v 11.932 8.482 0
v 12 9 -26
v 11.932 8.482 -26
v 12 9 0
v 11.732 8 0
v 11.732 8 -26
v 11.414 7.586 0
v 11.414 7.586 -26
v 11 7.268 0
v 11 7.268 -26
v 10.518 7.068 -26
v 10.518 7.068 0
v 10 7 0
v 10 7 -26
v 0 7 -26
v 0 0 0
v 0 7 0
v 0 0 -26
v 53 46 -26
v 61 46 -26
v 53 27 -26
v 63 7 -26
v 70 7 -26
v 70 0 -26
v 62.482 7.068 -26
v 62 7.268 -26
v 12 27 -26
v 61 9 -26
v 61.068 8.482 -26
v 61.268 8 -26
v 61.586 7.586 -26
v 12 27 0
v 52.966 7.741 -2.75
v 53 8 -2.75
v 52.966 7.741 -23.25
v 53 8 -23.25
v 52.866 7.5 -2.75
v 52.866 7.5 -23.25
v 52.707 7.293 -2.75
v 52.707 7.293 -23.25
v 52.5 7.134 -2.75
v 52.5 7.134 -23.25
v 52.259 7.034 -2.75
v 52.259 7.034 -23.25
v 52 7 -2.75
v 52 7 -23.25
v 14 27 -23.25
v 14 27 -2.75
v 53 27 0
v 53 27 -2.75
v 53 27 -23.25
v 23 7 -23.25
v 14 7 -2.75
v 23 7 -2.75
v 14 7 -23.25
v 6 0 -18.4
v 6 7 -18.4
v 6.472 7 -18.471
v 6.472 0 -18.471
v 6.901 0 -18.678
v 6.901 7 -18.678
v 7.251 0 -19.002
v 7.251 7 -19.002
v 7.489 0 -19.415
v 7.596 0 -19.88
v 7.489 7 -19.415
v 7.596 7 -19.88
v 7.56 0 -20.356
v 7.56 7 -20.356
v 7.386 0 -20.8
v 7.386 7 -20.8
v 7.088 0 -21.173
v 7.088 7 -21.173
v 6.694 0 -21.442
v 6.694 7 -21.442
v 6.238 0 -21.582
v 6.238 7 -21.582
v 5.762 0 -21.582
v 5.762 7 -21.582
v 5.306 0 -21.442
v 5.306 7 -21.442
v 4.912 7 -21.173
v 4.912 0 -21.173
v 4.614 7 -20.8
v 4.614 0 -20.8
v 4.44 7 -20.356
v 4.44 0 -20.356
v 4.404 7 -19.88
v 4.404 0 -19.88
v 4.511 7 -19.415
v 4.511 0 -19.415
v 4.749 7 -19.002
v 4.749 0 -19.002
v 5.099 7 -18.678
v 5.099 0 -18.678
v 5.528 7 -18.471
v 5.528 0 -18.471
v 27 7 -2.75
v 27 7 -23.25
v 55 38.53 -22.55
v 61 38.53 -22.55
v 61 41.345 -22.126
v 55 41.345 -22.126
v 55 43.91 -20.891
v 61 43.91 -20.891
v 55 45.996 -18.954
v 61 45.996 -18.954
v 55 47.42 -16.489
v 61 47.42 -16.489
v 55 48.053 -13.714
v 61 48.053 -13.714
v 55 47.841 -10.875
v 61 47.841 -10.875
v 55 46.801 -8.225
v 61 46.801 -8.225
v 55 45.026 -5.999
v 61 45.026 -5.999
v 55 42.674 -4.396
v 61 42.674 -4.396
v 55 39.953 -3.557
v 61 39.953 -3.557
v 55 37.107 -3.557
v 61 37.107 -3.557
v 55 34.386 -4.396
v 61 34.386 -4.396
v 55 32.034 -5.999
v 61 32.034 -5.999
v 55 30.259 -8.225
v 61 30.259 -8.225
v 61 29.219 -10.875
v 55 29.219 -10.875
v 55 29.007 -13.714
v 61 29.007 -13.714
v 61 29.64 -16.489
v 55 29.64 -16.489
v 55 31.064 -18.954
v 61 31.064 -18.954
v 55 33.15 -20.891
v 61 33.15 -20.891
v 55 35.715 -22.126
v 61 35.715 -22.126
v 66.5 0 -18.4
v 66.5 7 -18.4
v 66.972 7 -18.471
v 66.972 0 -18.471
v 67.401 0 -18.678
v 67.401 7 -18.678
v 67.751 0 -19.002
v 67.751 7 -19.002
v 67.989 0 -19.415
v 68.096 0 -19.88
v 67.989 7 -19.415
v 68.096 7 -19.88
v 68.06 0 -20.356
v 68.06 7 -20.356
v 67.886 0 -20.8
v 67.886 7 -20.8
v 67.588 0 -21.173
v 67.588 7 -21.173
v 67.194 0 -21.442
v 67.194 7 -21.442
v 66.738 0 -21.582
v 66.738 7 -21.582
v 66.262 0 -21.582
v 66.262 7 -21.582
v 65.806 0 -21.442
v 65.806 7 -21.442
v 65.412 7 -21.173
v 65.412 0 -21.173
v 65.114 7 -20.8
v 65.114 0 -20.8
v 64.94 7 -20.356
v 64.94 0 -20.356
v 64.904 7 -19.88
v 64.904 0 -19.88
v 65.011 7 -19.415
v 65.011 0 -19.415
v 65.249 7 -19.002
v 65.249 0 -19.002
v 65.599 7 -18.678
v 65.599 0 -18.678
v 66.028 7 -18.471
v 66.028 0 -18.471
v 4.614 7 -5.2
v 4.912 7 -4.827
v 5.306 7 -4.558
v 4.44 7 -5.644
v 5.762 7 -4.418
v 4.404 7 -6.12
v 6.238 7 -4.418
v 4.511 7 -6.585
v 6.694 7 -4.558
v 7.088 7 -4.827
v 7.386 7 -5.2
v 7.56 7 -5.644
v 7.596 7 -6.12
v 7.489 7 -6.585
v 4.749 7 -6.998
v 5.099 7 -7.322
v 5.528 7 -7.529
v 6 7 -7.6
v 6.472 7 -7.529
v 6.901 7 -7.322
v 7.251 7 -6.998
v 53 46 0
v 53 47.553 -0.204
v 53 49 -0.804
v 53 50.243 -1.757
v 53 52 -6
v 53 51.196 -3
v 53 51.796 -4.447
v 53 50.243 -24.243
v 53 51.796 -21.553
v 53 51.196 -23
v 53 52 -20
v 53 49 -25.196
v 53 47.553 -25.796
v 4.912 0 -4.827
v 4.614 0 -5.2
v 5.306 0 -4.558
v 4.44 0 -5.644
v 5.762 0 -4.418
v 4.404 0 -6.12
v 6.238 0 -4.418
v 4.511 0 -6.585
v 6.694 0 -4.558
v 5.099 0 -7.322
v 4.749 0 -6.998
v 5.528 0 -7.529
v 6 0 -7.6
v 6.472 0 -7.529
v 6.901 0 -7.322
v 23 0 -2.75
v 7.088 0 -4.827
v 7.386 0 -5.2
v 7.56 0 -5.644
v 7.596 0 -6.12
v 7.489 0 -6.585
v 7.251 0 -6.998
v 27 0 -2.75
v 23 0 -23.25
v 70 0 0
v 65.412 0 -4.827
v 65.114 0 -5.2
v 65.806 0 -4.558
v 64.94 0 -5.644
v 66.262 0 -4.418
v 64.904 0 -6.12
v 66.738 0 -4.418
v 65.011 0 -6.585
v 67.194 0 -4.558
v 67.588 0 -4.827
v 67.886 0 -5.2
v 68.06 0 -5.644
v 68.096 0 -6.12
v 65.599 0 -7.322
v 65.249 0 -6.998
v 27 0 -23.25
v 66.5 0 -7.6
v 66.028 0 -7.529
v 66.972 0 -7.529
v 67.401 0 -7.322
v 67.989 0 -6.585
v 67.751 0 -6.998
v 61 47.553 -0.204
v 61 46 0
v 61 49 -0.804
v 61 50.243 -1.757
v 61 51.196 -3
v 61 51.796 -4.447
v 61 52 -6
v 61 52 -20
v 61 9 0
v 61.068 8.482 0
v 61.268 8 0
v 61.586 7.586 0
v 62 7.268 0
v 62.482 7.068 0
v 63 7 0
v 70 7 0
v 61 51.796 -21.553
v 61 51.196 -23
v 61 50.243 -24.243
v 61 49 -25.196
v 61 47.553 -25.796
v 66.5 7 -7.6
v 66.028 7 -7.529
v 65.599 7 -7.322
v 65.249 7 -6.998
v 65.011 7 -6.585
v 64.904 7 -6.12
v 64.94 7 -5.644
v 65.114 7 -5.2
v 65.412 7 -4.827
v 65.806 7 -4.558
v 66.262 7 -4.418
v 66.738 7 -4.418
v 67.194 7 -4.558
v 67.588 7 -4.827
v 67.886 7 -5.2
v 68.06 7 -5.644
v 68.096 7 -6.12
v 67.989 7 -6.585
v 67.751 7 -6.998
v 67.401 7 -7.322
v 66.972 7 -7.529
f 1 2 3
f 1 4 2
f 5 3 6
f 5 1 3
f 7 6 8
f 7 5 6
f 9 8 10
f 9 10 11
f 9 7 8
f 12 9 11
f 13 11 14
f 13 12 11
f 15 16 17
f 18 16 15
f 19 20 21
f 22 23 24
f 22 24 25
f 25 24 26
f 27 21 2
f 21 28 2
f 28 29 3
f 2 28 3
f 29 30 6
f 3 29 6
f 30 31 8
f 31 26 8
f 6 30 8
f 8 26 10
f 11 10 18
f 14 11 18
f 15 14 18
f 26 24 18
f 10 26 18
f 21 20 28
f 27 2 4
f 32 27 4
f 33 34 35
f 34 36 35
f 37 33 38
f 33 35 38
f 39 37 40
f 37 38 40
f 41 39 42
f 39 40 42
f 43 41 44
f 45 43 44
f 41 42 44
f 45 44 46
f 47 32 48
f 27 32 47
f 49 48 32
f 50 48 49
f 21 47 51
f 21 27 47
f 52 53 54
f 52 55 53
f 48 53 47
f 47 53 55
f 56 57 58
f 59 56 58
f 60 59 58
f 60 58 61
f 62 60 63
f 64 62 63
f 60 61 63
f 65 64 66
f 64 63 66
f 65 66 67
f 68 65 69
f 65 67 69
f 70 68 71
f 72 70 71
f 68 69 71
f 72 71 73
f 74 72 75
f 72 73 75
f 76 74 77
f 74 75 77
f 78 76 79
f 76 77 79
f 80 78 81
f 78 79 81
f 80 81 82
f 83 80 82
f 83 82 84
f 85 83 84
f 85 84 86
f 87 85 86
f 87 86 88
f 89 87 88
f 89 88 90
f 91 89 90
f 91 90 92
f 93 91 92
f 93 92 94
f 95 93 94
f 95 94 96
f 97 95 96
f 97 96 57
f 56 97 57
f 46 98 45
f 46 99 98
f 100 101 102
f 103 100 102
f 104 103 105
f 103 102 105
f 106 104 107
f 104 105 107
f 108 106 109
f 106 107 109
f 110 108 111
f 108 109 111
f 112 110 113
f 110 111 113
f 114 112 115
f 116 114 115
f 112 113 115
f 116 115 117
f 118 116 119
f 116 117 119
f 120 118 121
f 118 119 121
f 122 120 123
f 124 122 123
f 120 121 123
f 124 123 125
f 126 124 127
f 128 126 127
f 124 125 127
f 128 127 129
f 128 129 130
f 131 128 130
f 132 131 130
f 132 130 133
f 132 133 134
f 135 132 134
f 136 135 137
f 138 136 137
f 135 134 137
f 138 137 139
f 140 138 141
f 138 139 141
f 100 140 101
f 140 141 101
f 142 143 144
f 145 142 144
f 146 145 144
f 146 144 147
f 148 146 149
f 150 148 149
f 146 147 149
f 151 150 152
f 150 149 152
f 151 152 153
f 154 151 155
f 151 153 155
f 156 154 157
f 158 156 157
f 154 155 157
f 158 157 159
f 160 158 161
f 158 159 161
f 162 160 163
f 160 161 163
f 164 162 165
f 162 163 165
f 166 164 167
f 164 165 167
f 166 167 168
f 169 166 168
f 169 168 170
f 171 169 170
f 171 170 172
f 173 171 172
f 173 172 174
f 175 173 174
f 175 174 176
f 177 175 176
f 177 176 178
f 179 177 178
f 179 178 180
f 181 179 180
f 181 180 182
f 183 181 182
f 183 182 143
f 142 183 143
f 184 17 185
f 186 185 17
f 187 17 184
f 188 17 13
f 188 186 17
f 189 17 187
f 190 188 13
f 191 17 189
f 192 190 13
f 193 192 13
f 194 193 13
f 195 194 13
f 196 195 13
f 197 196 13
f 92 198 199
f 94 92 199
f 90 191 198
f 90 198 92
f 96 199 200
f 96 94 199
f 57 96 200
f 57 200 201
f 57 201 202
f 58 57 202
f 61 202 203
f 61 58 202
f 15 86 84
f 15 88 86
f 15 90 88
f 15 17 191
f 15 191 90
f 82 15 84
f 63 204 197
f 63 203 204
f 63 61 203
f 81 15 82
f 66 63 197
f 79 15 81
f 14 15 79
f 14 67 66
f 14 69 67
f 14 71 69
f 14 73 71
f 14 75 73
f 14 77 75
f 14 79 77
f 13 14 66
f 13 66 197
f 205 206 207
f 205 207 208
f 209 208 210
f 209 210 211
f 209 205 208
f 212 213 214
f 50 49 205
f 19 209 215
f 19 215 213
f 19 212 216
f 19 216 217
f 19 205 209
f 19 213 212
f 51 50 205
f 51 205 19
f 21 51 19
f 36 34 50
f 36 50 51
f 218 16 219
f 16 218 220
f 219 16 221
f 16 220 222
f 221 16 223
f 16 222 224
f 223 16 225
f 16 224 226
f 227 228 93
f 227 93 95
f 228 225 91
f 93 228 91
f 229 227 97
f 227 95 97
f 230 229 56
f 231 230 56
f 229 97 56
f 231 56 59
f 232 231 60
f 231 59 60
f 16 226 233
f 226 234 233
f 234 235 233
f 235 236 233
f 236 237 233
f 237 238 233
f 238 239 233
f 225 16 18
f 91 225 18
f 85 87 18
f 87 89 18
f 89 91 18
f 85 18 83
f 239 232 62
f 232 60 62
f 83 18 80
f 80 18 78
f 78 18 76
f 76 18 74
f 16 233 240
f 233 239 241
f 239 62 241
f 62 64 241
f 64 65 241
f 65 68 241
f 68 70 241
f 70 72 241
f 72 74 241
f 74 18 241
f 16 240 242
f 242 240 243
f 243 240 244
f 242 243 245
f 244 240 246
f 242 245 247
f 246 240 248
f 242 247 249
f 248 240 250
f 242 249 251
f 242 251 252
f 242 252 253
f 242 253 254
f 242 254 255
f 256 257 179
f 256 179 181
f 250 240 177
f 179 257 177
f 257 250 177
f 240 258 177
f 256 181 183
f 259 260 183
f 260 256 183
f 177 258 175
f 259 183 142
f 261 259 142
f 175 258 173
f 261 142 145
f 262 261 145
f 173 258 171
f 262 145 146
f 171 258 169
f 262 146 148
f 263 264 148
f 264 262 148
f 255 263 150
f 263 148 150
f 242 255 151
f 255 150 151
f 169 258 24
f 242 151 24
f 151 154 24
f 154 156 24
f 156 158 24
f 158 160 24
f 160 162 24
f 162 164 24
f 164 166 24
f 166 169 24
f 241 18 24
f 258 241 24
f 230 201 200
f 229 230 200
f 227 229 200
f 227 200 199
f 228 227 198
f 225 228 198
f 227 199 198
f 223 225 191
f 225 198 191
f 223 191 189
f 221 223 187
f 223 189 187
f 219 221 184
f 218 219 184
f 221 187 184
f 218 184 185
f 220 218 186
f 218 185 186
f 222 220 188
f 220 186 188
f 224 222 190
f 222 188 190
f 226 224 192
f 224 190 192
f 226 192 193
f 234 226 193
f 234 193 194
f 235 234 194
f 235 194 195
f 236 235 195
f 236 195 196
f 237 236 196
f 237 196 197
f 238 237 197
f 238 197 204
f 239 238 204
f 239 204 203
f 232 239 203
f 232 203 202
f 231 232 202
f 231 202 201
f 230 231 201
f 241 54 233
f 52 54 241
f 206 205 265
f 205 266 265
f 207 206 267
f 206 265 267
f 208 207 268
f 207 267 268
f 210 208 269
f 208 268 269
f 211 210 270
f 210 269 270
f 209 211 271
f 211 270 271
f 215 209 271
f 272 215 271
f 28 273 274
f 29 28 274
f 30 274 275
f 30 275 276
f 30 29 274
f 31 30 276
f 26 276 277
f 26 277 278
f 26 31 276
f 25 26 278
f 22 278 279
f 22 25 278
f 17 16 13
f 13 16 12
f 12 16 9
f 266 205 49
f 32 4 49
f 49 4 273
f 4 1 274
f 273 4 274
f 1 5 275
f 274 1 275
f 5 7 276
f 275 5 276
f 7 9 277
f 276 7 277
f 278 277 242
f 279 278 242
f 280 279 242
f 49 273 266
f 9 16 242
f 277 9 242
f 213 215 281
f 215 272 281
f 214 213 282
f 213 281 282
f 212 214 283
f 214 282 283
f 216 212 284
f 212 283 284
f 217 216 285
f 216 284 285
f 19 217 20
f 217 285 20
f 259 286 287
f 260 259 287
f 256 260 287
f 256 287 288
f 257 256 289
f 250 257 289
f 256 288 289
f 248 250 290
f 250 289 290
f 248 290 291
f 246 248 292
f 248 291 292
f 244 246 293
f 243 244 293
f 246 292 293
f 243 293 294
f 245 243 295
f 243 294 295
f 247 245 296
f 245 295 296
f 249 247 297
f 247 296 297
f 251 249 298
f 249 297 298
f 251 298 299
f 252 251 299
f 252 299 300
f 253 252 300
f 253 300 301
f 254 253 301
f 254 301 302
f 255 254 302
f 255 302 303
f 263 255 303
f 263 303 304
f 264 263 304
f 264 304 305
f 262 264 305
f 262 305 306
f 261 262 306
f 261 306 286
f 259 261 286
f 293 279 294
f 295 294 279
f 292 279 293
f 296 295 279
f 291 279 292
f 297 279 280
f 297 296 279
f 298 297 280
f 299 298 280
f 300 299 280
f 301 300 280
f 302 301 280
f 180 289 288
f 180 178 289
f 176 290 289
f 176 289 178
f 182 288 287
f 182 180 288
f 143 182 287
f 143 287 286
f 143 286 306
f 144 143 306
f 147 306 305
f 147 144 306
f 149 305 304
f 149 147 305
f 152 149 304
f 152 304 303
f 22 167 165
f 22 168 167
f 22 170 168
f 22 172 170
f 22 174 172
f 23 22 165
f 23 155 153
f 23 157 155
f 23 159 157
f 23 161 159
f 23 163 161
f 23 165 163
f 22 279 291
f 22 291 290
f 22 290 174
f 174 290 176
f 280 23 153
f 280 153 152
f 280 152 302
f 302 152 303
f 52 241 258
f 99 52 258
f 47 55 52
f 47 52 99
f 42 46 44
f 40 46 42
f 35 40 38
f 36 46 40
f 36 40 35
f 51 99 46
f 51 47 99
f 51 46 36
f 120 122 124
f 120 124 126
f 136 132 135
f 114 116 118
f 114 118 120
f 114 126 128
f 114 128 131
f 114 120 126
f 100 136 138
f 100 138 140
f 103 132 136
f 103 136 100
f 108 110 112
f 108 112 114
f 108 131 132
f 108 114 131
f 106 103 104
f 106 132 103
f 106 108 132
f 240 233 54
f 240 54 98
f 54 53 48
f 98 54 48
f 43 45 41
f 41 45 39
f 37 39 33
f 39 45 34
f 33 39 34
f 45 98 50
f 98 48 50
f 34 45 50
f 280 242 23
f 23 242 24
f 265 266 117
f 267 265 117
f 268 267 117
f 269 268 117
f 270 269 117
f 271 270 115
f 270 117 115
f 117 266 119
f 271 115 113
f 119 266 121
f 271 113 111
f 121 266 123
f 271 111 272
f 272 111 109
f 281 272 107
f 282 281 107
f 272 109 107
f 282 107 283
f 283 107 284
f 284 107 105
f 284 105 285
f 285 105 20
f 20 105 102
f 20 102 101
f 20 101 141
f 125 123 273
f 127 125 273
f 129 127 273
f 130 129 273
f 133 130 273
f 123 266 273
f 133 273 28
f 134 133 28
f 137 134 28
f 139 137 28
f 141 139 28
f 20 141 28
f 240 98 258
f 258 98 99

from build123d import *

# Parameters (mm, degrees)
ESQUISSE1_W             = 70
ESQUISSE1_H             = 26
BOSS_EXTRU_1_DEPTH      = 7
ESQUISSE2_W             = 8
ESQUISSE2_H             = 26
BOSS_EXTRU_2_DEPTH      = 45
BOSS_EXTRU_3_DEPTH      = 20
ENL_V_MAT_EXTRU_1_REACH = 89.184
ESQUISSE4_W             = 4
ESQUISSE4_H             = 20.5
CONG_1_R                = 1
CONG_2_R                = 2
ENL_V_MAT_EXTRU_2_REACH = 89.184
ESQUISSE5_R             = 1.6
CONG_3_R                = 6
ESQUISSE6_R             = 9.55
ENL_V_MAT_EXTRU_3_DEPTH = 6


with BuildPart() as part:
    # Esquisse1 → Boss.-Extru.1 (new body)
    with BuildSketch(Plane(origin=(0, 0, 0), x_dir=(1, 0, 0), z_dir=(0, 1, 0))):
        with Locations((35, 13)):
            Rectangle(ESQUISSE1_W, ESQUISSE1_H)
    extrude(amount=BOSS_EXTRU_1_DEPTH)

    # Esquisse2 → Boss.-Extru.2 (add)
    with BuildSketch(Plane(origin=(0, 7, 0), x_dir=(1, 0, 0), z_dir=(0, 1, 0))):
        with Locations((57, 13)):
            Rectangle(ESQUISSE2_W, ESQUISSE2_H)
    extrude(amount=BOSS_EXTRU_2_DEPTH)

    # Esquisse3 → Boss.-Extru.3 (add)
    with BuildSketch(Plane(origin=(0, 7, 0), x_dir=(1, 0, 0), z_dir=(0, 1, 0))):
        Polygon((53, 26), (12, 26), (12, 0), (53, 0), (53, 2.75), (14, 2.75), (14, 23.25), (53, 23.25), align=None)
    extrude(amount=BOSS_EXTRU_3_DEPTH)

    # Esquisse4 → Enlèv. mat.-Extru.1 (cut, up to next)
    with BuildSketch(Plane(origin=(0, 7, 0), x_dir=(1, 0, 0), z_dir=(0, 1, 0)), mode=Mode.PRIVATE) as enl_v_mat_extru_1_sk1:
        with Locations((25, 13)):
            Rectangle(ESQUISSE4_W, ESQUISSE4_H)
    enl_v_mat_extru_1_tool1 = extrude(enl_v_mat_extru_1_sk1.sketch, amount=-ENL_V_MAT_EXTRU_1_REACH, mode=Mode.PRIVATE) & part.part
    add(enl_v_mat_extru_1_tool1.solids().sort_by_distance((25, 7, -13))[0], mode=Mode.SUBTRACT)

    # Congé1
    cong_1_edges = [part.edges().sort_by_distance(p)[0] for p in [
        (53, 7, -13),
    ]]
    fillet(cong_1_edges, radius=CONG_1_R)

    # Congé2
    cong_2_edges = [part.edges().sort_by_distance(p)[0] for p in [
        (61, 7, -13),
        (12, 7, -13),
    ]]
    fillet(cong_2_edges, radius=CONG_2_R)

    # Esquisse5 → Enlèv. mat.-Extru.2 (cut, up to next)
    with BuildSketch(Plane(origin=(0, 7, 0), x_dir=(1, 0, 0), z_dir=(0, 1, 0)), mode=Mode.PRIVATE) as enl_v_mat_extru_2_sk1:
        with Locations(Location((6, 20, 0), (0, 0, 270))):
            Circle(ESQUISSE5_R)
    enl_v_mat_extru_2_tool1 = extrude(enl_v_mat_extru_2_sk1.sketch, amount=-ENL_V_MAT_EXTRU_2_REACH, mode=Mode.PRIVATE) & part.part
    # Esquisse5 → Enlèv. mat.-Extru.2 (cut, up to next)
    with BuildSketch(Plane(origin=(0, 7, 0), x_dir=(1, 0, 0), z_dir=(0, 1, 0)), mode=Mode.PRIVATE) as enl_v_mat_extru_2_sk2:
        with Locations(Location((66.5, 20, 0), (0, 0, 270))):
            Circle(ESQUISSE5_R)
    enl_v_mat_extru_2_tool2 = extrude(enl_v_mat_extru_2_sk2.sketch, amount=-ENL_V_MAT_EXTRU_2_REACH, mode=Mode.PRIVATE) & part.part
    # Esquisse5 → Enlèv. mat.-Extru.2 (cut, up to next)
    with BuildSketch(Plane(origin=(0, 7, 0), x_dir=(1, 0, 0), z_dir=(0, 1, 0)), mode=Mode.PRIVATE) as enl_v_mat_extru_2_sk3:
        with Locations(Location((66.5, 6, 0), (0, 0, 90))):
            Circle(ESQUISSE5_R)
    enl_v_mat_extru_2_tool3 = extrude(enl_v_mat_extru_2_sk3.sketch, amount=-ENL_V_MAT_EXTRU_2_REACH, mode=Mode.PRIVATE) & part.part
    # Esquisse5 → Enlèv. mat.-Extru.2 (cut, up to next)
    with BuildSketch(Plane(origin=(0, 7, 0), x_dir=(1, 0, 0), z_dir=(0, 1, 0)), mode=Mode.PRIVATE) as enl_v_mat_extru_2_sk4:
        with Locations(Location((6, 6, 0), (0, 0, 90))):
            Circle(ESQUISSE5_R)
    enl_v_mat_extru_2_tool4 = extrude(enl_v_mat_extru_2_sk4.sketch, amount=-ENL_V_MAT_EXTRU_2_REACH, mode=Mode.PRIVATE) & part.part
    add(enl_v_mat_extru_2_tool1.solids().sort_by_distance((6, 7, -20))[0], mode=Mode.SUBTRACT)
    add(enl_v_mat_extru_2_tool2.solids().sort_by_distance((66.5, 7, -20))[0], mode=Mode.SUBTRACT)
    add(enl_v_mat_extru_2_tool3.solids().sort_by_distance((66.5, 7, -6))[0], mode=Mode.SUBTRACT)
    add(enl_v_mat_extru_2_tool4.solids().sort_by_distance((6, 7, -6))[0], mode=Mode.SUBTRACT)

    # Congé3
    cong_3_edges = [part.edges().sort_by_distance(p)[0] for p in [
        (57, 52, -26),
        (57, 52, 0),
    ]]
    fillet(cong_3_edges, radius=CONG_3_R)

    # Esquisse6 → Enlèv. mat.-Extru.3 (cut)
    with BuildSketch(Plane(origin=(61, 0, 0), x_dir=(0, 0, -1), z_dir=(1, 0, 0))):
        with Locations((13, 38.53)):
            Circle(ESQUISSE6_R)
    extrude(amount=-ENL_V_MAT_EXTRU_3_DEPTH, mode=Mode.SUBTRACT)


solid = part.part
